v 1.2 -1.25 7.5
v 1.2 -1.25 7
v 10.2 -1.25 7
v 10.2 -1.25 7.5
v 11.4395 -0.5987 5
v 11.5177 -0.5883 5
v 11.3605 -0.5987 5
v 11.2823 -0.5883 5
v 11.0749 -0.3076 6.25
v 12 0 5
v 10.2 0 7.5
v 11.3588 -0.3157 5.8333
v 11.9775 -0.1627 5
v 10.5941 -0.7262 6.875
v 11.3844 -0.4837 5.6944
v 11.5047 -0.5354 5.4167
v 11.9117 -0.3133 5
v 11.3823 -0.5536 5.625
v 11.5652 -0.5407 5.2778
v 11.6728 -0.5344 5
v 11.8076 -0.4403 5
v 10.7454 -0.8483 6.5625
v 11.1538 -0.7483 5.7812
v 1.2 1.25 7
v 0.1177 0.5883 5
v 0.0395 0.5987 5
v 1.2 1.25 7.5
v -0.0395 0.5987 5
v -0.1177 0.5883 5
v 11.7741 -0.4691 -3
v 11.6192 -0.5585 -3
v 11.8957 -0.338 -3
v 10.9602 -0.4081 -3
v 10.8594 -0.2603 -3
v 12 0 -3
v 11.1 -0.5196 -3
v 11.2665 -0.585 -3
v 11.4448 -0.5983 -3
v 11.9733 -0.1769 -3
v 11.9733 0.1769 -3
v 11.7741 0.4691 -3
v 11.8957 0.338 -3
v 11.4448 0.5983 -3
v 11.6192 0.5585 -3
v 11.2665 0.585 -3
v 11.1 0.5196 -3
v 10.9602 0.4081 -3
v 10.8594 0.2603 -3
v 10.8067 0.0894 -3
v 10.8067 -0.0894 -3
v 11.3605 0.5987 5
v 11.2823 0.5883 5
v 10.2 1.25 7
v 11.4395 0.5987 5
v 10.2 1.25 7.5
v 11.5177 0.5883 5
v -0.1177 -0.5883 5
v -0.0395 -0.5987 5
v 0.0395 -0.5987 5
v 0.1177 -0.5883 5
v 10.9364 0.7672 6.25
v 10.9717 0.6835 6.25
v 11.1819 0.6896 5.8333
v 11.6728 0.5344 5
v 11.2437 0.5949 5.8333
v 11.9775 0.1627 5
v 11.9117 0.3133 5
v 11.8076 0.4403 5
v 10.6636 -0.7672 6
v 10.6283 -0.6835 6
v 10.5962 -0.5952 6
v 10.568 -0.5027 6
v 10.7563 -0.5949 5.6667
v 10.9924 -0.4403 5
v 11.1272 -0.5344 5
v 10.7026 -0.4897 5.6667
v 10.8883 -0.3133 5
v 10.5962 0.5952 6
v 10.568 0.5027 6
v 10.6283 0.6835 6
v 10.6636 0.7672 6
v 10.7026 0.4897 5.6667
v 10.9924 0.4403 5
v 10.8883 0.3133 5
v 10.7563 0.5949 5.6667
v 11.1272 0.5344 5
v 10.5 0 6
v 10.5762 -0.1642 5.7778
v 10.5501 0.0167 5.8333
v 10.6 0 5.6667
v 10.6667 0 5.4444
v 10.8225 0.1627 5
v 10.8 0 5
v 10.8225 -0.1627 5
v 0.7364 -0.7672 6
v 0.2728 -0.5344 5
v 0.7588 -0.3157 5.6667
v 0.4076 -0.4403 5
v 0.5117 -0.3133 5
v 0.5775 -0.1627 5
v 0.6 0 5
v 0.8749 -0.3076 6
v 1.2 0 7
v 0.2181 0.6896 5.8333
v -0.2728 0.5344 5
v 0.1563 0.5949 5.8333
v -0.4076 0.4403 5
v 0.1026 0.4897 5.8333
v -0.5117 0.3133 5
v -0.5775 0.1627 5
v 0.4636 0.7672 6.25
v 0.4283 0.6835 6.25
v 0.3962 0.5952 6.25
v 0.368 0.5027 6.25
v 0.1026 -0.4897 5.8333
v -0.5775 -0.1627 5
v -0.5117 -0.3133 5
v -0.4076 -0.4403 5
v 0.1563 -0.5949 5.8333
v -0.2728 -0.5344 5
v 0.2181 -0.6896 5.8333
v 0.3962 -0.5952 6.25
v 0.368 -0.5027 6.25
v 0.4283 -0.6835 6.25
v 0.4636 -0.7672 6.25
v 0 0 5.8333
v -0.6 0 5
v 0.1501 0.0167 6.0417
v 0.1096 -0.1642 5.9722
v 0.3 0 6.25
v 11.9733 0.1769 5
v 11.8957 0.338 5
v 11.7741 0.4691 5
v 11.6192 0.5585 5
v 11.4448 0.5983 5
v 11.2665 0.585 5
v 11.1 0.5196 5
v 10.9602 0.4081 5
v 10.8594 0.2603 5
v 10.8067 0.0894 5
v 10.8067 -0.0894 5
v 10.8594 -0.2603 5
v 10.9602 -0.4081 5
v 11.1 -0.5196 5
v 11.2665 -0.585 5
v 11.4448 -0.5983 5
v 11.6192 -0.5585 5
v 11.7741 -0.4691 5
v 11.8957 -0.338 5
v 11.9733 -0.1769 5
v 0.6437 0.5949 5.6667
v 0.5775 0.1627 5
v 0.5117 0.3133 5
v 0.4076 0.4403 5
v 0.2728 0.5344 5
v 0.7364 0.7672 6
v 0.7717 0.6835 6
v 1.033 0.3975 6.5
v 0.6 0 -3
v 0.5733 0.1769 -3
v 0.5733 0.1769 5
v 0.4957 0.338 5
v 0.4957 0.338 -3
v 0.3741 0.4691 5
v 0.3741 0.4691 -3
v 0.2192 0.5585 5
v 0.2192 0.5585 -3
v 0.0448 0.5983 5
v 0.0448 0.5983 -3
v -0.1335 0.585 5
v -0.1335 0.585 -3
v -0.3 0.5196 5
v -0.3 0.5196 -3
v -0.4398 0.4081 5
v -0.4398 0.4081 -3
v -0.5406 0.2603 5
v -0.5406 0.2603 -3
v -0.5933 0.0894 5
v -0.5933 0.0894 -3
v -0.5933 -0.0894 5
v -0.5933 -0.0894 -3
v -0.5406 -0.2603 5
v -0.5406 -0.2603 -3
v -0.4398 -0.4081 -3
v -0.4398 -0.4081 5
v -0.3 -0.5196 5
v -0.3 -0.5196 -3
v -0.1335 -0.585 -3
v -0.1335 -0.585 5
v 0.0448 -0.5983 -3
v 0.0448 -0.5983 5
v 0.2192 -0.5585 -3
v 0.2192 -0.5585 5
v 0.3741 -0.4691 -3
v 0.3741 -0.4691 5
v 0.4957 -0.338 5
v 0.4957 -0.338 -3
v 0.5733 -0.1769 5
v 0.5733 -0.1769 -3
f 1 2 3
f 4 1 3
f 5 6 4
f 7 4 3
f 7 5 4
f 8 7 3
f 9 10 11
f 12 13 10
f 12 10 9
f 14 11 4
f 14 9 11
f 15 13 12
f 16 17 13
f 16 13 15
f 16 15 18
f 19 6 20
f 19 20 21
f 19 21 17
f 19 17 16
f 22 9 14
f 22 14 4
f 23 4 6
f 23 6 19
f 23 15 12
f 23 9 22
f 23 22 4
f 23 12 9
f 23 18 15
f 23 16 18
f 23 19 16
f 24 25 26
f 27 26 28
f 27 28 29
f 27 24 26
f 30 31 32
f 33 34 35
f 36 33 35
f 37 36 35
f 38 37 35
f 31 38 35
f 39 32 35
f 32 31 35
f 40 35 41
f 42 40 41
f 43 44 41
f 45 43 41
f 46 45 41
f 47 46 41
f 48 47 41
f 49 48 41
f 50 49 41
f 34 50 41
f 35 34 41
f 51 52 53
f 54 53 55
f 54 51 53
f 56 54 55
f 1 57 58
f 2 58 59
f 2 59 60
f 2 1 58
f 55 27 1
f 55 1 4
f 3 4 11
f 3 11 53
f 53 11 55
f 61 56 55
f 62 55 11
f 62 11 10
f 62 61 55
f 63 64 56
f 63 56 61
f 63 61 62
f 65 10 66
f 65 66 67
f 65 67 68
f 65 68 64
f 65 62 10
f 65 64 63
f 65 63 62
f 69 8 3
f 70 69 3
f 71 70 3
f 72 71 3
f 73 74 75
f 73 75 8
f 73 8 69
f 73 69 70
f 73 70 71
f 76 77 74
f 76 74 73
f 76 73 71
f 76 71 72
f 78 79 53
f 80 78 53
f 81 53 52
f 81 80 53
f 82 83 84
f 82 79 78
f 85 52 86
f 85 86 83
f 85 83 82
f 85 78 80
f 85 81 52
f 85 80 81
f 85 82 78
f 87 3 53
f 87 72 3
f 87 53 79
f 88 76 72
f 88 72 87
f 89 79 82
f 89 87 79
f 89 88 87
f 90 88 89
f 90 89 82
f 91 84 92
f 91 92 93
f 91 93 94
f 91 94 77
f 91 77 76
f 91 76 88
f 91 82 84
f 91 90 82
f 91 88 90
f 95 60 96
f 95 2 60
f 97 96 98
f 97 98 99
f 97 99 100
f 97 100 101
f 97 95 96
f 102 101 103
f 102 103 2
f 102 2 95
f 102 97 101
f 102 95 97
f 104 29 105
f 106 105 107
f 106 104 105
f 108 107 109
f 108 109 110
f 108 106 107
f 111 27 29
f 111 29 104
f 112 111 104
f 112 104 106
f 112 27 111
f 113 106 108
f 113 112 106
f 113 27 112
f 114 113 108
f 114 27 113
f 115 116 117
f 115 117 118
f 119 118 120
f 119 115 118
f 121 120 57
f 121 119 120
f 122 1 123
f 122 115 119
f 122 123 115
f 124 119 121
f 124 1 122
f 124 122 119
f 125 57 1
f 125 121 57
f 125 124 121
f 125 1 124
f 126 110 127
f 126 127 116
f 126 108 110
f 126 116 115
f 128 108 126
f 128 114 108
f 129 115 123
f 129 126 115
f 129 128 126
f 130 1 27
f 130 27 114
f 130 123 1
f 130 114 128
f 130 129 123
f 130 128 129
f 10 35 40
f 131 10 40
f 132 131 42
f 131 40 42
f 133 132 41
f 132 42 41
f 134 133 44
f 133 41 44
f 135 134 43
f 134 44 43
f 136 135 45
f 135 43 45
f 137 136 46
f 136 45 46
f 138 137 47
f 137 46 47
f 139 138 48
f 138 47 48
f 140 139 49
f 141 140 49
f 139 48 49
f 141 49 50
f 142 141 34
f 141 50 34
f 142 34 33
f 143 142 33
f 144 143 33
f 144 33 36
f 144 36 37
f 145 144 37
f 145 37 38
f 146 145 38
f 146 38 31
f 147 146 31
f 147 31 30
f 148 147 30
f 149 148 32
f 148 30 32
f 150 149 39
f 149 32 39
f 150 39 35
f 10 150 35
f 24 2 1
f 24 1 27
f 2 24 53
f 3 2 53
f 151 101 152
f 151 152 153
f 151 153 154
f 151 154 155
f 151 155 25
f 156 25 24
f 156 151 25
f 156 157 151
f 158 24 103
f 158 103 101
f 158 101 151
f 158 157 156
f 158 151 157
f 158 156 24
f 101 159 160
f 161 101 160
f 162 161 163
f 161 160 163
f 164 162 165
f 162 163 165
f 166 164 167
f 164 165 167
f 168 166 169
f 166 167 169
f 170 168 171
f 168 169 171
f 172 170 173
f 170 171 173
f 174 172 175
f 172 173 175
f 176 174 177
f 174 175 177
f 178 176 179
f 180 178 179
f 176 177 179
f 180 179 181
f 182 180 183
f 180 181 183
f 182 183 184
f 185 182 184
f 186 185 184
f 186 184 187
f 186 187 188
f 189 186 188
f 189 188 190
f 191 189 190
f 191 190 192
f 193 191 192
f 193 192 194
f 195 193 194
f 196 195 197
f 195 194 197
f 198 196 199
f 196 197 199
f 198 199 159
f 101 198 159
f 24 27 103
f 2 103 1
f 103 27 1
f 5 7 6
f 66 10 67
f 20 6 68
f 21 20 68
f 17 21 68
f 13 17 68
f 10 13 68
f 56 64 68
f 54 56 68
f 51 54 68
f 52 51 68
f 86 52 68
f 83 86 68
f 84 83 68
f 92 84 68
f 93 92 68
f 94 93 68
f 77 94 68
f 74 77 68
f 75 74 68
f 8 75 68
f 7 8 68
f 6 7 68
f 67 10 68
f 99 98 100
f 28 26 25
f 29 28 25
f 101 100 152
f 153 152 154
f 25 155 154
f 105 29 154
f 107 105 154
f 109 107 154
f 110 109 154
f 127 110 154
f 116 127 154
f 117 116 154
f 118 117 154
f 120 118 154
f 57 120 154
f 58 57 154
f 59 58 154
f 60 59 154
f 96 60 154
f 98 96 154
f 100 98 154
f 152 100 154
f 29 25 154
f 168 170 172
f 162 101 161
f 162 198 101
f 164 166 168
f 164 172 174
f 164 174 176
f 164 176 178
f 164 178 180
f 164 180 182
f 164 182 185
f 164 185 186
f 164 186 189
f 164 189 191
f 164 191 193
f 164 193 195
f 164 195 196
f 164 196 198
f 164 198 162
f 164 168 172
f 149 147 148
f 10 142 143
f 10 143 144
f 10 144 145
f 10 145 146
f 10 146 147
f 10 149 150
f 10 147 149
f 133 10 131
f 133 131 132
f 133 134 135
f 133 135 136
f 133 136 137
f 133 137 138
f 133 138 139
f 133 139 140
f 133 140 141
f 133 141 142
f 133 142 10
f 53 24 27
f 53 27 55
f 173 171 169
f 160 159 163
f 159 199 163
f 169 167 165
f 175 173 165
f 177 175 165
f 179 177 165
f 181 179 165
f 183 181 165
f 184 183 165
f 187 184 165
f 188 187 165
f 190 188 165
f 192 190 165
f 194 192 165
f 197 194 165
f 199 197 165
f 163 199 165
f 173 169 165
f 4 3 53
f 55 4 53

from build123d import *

# Parameters (mm, degrees)
SKETCH_R     = 0.6
PAD_DEPTH    = 8
SKETCH001_W  = 9
SKETCH001_H  = 2.5
PAD001_DEPTH = 0.5
SKETCH002_W  = 2.5
SKETCH002_H  = 0.5
SKETCH003_R  = 0.6
SKETCH004_R  = 0.6
SKETCH005_W  = 2.5
SKETCH005_H  = 0.5


with BuildPart() as pad:
    # Sketch → Pad (new body)
    with BuildSketch(Plane.XY.offset(-3)):
        Circle(SKETCH_R)
        with Locations((11.4, 0)):
            Circle(SKETCH_R)
    extrude(amount=PAD_DEPTH)


with BuildPart() as pad001:
    # Sketch001 → Pad001 (new body)
    with BuildSketch(Plane.XY.offset(7)):
        with Locations((5.7, 0)):
            Rectangle(SKETCH001_W, SKETCH001_H)
    extrude(amount=PAD001_DEPTH)


with BuildPart() as loft_body:
    # Sketch002 → Loft section 0
    with BuildSketch(Plane(origin=(10.2, 0, 7), x_dir=(0, 1, 0), z_dir=(1, 0, 0))):
        with Locations((0, 0.25)):
            Rectangle(SKETCH002_W, SKETCH002_H)
    # Sketch003 → Loft section 1
    with BuildSketch(Plane.XY.offset(5)):
        with Locations((11.4, 0)):
            Circle(SKETCH003_R)
    loft()


with BuildPart() as loft001:
    # Sketch004 → Loft001 section 0
    with BuildSketch(Plane.XY.offset(5)):
        Circle(SKETCH004_R)
    # Sketch005 → Loft001 section 1
    with BuildSketch(Plane(origin=(1.2, 0, 7), x_dir=(0, -1, 0), z_dir=(-1, 0, 0))):
        with Locations((0, 0.25)):
            Rectangle(SKETCH005_W, SKETCH005_H)
    loft()


solid = Compound([pad.part, pad001.part, loft_body.part, loft001.part])
